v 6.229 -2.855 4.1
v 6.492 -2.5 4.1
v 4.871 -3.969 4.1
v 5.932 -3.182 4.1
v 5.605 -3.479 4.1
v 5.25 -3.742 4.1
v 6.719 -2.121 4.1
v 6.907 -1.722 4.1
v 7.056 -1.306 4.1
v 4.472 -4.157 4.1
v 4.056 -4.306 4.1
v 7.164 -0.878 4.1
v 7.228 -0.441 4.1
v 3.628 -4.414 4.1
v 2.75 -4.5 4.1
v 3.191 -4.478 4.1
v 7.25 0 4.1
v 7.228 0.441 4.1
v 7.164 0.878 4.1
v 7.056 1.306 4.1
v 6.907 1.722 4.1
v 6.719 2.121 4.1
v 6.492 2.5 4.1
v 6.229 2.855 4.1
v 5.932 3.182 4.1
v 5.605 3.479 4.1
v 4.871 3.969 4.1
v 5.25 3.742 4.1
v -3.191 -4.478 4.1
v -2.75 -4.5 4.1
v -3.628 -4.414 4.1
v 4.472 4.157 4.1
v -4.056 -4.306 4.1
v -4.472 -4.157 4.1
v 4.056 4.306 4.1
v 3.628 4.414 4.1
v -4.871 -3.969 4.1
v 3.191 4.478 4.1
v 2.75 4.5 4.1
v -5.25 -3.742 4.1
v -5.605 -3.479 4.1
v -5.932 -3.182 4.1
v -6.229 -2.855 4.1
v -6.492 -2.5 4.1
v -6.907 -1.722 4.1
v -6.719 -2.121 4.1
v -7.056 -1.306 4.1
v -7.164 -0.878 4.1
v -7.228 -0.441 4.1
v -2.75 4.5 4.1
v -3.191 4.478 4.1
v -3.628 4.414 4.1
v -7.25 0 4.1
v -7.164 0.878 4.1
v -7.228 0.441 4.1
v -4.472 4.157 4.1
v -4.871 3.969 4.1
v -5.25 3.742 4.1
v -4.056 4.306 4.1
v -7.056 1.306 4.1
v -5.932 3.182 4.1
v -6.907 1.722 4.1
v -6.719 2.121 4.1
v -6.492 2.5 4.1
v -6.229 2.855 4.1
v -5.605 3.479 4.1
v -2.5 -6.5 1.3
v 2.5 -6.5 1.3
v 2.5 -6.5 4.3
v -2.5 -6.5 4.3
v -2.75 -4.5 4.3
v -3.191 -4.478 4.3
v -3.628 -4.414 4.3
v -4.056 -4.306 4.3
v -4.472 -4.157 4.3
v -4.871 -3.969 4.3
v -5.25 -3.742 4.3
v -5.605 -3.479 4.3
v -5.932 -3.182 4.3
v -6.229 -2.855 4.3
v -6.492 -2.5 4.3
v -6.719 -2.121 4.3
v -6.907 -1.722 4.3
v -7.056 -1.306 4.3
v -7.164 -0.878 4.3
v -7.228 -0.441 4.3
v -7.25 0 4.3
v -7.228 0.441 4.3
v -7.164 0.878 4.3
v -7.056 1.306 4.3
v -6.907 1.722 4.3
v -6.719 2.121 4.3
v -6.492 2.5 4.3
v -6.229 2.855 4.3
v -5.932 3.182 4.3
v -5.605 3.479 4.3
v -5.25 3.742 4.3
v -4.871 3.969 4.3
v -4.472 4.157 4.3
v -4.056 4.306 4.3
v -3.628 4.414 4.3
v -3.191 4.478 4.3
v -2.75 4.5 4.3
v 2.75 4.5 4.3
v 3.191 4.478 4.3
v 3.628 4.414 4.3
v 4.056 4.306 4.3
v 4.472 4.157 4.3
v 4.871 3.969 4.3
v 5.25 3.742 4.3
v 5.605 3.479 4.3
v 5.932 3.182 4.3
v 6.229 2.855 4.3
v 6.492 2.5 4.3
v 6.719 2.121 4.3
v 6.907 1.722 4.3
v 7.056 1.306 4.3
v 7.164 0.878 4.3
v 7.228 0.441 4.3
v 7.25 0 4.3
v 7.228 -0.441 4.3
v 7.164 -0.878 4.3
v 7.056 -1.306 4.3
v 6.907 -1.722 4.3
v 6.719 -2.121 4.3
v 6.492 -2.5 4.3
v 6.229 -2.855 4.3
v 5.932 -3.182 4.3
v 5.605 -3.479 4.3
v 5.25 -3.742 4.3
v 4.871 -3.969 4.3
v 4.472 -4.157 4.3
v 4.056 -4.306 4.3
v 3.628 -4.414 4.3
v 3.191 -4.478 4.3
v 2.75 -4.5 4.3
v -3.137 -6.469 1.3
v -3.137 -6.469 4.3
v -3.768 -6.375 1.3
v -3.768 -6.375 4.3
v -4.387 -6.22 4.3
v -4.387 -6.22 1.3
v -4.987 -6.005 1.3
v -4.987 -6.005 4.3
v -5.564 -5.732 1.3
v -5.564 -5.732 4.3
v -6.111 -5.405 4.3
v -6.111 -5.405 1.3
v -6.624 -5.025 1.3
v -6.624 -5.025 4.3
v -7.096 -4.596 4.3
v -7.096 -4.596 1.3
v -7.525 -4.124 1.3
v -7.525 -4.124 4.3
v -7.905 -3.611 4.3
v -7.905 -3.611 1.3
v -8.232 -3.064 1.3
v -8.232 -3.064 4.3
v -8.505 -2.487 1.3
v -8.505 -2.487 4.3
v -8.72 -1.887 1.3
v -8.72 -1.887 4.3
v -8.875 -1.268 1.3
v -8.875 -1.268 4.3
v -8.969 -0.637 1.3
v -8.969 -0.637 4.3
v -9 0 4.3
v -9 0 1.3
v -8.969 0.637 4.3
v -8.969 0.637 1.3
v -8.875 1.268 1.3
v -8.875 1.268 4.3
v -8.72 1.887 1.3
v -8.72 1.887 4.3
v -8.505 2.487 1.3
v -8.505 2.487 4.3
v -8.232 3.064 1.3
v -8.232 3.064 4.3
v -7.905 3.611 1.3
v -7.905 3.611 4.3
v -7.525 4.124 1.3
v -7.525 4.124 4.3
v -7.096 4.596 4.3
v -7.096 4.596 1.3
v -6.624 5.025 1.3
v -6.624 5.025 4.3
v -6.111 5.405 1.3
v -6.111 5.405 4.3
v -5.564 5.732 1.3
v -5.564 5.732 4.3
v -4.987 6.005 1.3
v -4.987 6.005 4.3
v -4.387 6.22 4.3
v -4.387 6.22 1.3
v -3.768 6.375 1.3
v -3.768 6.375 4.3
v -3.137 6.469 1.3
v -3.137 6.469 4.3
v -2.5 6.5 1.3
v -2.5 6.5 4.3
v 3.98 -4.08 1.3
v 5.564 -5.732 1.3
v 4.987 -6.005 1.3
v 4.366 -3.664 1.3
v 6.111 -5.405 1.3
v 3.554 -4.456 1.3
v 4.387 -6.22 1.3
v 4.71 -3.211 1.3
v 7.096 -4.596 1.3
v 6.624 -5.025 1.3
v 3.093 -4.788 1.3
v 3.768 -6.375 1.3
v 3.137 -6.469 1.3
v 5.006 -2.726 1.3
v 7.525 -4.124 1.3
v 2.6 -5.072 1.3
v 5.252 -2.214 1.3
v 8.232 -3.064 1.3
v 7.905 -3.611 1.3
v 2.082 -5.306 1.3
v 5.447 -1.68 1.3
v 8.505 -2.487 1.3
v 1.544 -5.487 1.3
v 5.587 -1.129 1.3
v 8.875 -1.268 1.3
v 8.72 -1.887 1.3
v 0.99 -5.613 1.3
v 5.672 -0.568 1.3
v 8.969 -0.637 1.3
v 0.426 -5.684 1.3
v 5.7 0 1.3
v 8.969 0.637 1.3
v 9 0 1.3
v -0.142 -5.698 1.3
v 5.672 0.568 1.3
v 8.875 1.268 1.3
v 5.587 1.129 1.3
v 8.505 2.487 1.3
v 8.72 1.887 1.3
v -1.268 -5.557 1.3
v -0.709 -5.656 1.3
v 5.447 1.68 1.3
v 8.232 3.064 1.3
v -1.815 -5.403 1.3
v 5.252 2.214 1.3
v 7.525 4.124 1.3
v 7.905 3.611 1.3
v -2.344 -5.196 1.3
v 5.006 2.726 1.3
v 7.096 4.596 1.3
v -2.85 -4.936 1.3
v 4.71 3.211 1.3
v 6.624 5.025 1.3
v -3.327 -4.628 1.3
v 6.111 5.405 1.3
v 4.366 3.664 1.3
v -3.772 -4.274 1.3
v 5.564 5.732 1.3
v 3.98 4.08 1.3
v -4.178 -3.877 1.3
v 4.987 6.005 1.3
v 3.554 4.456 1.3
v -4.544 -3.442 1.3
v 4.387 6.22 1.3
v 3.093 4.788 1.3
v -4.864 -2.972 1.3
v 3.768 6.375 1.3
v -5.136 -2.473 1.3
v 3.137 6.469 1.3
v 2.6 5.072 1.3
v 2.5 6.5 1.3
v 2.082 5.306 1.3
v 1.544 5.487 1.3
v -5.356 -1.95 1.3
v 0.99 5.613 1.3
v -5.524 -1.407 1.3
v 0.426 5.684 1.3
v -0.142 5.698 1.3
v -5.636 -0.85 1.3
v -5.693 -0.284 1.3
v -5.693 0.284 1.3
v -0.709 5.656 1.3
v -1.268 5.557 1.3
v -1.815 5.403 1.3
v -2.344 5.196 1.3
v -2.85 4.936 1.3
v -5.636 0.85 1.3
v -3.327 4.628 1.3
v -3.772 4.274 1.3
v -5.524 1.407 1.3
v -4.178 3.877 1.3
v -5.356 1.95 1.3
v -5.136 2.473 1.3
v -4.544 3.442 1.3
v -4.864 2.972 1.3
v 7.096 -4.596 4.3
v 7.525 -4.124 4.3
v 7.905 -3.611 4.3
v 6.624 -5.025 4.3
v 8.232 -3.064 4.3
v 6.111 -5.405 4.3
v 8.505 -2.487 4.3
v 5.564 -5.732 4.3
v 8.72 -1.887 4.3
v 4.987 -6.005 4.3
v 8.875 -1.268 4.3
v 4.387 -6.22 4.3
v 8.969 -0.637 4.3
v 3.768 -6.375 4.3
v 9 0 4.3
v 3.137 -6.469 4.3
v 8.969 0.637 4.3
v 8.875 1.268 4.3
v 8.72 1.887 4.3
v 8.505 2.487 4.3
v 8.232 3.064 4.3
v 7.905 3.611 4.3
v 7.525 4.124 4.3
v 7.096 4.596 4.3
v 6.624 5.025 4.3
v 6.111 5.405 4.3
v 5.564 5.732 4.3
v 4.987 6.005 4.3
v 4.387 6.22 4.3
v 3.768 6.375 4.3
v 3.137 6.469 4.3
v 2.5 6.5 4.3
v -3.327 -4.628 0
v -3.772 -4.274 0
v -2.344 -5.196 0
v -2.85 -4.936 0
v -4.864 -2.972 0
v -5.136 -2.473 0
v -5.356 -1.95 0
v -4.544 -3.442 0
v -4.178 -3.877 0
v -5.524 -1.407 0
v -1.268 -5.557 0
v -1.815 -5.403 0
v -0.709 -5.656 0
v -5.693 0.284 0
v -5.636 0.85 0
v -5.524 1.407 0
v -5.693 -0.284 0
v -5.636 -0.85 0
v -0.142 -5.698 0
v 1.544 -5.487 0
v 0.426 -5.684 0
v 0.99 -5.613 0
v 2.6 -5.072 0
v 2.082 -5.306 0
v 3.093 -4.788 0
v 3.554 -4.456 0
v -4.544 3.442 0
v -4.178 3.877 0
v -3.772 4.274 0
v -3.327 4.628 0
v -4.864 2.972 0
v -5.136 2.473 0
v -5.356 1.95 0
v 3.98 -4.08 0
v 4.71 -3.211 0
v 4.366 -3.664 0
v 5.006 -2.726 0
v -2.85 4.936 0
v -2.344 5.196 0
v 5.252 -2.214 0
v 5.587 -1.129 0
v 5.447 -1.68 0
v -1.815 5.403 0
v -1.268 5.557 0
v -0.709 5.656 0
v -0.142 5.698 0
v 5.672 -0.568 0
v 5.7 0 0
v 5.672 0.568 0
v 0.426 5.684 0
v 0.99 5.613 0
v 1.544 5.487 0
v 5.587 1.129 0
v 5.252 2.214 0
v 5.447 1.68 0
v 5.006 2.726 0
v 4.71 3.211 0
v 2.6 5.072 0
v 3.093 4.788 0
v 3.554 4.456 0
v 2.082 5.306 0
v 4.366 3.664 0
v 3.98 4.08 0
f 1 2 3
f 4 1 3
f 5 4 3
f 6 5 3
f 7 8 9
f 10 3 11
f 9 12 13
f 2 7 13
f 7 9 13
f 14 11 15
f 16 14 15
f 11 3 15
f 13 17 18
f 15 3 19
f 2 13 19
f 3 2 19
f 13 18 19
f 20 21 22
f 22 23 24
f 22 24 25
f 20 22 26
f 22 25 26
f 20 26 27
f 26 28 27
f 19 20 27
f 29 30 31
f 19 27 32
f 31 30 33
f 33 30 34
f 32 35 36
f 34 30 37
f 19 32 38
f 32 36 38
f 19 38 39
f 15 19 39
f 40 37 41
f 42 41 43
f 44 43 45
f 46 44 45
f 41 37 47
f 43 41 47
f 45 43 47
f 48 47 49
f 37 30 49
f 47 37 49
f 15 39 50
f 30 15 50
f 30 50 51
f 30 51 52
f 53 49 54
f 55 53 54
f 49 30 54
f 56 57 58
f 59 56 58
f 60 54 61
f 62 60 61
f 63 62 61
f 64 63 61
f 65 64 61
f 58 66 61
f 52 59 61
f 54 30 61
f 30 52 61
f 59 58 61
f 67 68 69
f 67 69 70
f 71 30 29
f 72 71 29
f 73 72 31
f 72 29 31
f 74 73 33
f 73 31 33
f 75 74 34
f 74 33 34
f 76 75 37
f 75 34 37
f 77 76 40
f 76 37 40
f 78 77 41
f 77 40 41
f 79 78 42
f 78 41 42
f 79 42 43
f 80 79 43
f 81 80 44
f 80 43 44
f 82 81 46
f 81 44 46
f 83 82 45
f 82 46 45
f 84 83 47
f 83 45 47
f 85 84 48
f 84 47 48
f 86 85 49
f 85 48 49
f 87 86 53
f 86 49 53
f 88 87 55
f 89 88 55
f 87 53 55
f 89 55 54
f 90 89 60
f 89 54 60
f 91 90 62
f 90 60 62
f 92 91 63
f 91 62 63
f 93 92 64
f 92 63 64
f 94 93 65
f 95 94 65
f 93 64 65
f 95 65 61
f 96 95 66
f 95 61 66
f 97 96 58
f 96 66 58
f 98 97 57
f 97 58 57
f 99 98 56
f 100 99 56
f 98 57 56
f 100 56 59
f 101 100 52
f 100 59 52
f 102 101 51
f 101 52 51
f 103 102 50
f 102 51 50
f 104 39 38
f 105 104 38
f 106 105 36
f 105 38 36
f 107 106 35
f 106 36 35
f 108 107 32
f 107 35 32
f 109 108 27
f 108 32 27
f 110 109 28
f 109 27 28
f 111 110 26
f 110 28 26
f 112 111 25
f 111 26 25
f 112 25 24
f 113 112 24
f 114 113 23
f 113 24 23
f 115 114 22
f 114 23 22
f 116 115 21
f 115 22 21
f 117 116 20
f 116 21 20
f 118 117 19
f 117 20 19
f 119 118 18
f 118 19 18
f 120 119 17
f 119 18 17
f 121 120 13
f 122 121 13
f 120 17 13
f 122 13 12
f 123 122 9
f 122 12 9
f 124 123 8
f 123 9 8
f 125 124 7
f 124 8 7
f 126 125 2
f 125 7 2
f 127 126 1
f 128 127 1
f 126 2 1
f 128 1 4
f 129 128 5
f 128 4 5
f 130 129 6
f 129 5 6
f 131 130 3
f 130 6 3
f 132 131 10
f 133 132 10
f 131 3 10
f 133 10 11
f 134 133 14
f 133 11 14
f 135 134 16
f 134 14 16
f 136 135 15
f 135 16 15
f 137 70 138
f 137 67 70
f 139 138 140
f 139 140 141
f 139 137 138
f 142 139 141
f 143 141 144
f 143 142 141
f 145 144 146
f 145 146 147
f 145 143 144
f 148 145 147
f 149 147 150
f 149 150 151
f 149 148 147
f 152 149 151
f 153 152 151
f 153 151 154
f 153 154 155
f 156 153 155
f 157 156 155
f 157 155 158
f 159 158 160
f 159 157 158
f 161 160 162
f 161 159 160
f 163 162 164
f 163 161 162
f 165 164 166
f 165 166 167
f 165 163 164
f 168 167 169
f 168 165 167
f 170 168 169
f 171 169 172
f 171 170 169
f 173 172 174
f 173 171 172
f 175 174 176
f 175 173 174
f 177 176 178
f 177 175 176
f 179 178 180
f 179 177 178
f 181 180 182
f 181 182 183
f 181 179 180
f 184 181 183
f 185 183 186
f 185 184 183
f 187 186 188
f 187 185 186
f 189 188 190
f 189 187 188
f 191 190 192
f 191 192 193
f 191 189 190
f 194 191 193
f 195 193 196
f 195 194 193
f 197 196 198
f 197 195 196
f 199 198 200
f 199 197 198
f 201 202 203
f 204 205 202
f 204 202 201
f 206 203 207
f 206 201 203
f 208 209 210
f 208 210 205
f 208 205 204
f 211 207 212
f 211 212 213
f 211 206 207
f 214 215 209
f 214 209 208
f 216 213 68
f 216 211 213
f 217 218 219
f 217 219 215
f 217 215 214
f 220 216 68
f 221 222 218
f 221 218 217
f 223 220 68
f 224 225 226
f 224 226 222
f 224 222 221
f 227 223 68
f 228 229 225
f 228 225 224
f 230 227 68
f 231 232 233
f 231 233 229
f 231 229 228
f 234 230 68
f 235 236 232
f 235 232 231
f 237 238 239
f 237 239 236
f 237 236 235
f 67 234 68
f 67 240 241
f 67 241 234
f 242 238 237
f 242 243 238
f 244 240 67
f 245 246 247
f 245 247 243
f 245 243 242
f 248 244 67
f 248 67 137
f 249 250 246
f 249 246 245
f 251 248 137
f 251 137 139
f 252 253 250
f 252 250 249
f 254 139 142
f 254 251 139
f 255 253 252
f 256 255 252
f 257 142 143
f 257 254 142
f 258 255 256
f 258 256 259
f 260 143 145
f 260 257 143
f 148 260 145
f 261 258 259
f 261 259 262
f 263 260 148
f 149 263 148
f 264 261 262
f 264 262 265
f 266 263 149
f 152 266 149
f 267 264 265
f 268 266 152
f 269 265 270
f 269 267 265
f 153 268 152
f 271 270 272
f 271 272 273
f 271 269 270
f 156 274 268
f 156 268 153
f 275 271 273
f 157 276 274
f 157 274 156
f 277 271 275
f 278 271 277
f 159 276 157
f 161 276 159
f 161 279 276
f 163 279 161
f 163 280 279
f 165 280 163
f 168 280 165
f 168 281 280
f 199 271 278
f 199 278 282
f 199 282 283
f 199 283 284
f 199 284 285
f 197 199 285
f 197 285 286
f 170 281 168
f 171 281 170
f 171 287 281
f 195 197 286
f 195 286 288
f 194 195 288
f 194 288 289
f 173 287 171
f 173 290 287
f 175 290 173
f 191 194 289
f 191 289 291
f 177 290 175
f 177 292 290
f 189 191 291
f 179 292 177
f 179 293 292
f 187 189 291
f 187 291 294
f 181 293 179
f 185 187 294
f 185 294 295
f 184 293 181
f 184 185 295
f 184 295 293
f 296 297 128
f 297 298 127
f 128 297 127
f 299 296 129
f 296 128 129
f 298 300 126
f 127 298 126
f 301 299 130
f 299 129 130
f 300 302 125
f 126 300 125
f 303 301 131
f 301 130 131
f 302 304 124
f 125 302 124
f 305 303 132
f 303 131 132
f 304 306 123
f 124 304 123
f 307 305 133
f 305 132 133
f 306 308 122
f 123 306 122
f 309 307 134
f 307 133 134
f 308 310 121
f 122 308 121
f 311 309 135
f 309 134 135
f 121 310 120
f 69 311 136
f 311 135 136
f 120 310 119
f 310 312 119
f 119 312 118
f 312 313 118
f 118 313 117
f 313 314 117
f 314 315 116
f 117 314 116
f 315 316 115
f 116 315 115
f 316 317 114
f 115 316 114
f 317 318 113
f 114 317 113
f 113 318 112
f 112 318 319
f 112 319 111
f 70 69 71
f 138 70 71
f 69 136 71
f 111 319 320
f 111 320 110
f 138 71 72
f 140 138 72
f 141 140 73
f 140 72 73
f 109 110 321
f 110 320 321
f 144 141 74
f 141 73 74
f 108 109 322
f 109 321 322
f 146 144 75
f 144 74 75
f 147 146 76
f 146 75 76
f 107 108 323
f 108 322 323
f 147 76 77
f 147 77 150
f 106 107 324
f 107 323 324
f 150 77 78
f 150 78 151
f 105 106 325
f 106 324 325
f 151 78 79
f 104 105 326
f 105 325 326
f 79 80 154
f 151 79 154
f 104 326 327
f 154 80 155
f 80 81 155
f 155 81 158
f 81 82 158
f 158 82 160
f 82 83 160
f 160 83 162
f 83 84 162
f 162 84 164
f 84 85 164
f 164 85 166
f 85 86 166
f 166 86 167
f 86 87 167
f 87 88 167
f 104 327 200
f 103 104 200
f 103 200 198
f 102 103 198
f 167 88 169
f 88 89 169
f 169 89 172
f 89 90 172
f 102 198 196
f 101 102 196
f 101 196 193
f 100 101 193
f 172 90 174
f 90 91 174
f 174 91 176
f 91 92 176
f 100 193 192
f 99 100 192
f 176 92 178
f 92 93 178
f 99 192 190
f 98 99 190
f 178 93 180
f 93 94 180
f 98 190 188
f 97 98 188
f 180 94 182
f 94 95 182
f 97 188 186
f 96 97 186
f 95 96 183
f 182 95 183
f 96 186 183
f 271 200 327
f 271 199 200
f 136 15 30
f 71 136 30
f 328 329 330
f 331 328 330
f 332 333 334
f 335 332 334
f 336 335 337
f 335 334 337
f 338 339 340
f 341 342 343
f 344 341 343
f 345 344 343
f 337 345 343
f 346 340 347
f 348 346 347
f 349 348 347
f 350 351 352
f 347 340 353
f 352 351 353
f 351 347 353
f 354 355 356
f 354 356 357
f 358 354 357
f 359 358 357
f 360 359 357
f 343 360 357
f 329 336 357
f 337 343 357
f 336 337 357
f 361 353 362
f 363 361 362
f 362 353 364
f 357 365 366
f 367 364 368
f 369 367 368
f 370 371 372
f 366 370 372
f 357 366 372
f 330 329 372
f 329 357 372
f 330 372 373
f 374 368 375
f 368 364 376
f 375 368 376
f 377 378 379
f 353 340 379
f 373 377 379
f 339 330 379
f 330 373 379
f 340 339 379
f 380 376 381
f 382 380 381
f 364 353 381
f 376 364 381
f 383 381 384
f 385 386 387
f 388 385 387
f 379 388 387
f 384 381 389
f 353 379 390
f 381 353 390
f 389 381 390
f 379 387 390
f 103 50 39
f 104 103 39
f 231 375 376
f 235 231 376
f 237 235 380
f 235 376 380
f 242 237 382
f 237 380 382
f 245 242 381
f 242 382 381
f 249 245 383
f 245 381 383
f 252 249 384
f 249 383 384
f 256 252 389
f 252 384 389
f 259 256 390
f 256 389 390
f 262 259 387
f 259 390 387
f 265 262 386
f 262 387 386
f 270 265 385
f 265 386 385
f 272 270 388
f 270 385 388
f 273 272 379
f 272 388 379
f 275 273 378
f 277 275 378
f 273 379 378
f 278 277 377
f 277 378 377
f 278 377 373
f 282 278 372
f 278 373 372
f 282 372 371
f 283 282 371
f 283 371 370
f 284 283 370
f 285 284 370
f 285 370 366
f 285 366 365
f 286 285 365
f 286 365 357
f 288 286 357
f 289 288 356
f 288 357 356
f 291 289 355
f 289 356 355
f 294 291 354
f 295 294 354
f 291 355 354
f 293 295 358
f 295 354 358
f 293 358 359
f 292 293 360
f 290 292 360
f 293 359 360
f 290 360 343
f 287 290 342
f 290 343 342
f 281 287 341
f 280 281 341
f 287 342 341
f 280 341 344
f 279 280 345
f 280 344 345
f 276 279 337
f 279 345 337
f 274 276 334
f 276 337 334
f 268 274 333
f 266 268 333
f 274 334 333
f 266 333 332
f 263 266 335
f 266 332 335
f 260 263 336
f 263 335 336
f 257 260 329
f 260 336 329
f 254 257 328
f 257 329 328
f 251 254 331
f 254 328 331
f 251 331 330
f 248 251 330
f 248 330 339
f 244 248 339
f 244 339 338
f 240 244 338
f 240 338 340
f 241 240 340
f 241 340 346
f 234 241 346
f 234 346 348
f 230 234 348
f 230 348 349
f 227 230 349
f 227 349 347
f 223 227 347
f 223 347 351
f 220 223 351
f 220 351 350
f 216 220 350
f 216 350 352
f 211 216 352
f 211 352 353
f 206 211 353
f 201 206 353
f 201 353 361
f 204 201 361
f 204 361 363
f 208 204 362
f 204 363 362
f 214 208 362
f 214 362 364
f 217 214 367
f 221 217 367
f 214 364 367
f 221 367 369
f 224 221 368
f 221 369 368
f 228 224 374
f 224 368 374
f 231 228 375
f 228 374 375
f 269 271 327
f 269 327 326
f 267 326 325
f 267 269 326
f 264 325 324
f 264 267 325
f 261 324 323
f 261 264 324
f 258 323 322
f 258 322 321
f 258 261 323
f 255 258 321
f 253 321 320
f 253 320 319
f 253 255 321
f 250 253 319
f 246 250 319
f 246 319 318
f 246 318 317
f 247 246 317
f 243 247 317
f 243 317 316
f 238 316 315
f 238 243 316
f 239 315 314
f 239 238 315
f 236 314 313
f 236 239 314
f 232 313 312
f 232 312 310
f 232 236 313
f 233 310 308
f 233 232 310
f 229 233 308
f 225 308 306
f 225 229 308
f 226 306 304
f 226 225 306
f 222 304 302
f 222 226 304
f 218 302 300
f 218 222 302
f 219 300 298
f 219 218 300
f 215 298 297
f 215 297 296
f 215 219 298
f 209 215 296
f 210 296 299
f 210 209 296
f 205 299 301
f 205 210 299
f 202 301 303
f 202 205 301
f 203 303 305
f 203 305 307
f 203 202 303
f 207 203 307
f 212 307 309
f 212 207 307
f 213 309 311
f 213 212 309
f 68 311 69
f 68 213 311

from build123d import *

# Parameters (mm, degrees)
SKETCH_1_R      = 5.7
EXTRUDE_1_DEPTH = 1.3
EXTRUDE_2_DEPTH = 2.8
EXTRUDE_3_DEPTH = 0.2


with BuildPart() as part:
    # Эскиз1 → Бобышка-Вытянуть1 (new body)
    with BuildSketch(Plane.XY):
        Circle(SKETCH_1_R)
    extrude(amount=EXTRUDE_1_DEPTH)

    # Эскиз2 → Бобышка-Вытянуть2 (add)
    with BuildSketch(Plane.XY.offset(1.3)):
        with BuildLine():
            Line((-2.5, 6.5), (2.5, 6.5))
            ThreePointArc((2.5, 6.5), (9, 0), (2.5, -6.5))
            Line((2.5, -6.5), (-2.5, -6.5))
            ThreePointArc((-2.5, -6.5), (-9, 0), (-2.5, 6.5))
        make_face()
    extrude(amount=EXTRUDE_2_DEPTH)

    # Эскиз3 → Бобышка-Вытянуть3 (add)
    with BuildSketch(Plane.XY.offset(4.1)):
        with BuildLine():
            Line((-2.5, 6.5), (2.5, 6.5))
            ThreePointArc((2.5, 6.5), (9, 0), (2.5, -6.5))
            Line((2.5, -6.5), (-2.5, -6.5))
            ThreePointArc((-2.5, -6.5), (-9, 0), (-2.5, 6.5))
        make_face()
        with BuildLine():
            Line((-2.75, 4.5), (2.75, 4.5))
            ThreePointArc((2.75, 4.5), (7.25, 0), (2.75, -4.5))
            Line((2.75, -4.5), (-2.75, -4.5))
            ThreePointArc((-2.75, -4.5), (-7.25, 0), (-2.75, 4.5))
        make_face(mode=Mode.SUBTRACT)
    extrude(amount=EXTRUDE_3_DEPTH)


solid = part.part
